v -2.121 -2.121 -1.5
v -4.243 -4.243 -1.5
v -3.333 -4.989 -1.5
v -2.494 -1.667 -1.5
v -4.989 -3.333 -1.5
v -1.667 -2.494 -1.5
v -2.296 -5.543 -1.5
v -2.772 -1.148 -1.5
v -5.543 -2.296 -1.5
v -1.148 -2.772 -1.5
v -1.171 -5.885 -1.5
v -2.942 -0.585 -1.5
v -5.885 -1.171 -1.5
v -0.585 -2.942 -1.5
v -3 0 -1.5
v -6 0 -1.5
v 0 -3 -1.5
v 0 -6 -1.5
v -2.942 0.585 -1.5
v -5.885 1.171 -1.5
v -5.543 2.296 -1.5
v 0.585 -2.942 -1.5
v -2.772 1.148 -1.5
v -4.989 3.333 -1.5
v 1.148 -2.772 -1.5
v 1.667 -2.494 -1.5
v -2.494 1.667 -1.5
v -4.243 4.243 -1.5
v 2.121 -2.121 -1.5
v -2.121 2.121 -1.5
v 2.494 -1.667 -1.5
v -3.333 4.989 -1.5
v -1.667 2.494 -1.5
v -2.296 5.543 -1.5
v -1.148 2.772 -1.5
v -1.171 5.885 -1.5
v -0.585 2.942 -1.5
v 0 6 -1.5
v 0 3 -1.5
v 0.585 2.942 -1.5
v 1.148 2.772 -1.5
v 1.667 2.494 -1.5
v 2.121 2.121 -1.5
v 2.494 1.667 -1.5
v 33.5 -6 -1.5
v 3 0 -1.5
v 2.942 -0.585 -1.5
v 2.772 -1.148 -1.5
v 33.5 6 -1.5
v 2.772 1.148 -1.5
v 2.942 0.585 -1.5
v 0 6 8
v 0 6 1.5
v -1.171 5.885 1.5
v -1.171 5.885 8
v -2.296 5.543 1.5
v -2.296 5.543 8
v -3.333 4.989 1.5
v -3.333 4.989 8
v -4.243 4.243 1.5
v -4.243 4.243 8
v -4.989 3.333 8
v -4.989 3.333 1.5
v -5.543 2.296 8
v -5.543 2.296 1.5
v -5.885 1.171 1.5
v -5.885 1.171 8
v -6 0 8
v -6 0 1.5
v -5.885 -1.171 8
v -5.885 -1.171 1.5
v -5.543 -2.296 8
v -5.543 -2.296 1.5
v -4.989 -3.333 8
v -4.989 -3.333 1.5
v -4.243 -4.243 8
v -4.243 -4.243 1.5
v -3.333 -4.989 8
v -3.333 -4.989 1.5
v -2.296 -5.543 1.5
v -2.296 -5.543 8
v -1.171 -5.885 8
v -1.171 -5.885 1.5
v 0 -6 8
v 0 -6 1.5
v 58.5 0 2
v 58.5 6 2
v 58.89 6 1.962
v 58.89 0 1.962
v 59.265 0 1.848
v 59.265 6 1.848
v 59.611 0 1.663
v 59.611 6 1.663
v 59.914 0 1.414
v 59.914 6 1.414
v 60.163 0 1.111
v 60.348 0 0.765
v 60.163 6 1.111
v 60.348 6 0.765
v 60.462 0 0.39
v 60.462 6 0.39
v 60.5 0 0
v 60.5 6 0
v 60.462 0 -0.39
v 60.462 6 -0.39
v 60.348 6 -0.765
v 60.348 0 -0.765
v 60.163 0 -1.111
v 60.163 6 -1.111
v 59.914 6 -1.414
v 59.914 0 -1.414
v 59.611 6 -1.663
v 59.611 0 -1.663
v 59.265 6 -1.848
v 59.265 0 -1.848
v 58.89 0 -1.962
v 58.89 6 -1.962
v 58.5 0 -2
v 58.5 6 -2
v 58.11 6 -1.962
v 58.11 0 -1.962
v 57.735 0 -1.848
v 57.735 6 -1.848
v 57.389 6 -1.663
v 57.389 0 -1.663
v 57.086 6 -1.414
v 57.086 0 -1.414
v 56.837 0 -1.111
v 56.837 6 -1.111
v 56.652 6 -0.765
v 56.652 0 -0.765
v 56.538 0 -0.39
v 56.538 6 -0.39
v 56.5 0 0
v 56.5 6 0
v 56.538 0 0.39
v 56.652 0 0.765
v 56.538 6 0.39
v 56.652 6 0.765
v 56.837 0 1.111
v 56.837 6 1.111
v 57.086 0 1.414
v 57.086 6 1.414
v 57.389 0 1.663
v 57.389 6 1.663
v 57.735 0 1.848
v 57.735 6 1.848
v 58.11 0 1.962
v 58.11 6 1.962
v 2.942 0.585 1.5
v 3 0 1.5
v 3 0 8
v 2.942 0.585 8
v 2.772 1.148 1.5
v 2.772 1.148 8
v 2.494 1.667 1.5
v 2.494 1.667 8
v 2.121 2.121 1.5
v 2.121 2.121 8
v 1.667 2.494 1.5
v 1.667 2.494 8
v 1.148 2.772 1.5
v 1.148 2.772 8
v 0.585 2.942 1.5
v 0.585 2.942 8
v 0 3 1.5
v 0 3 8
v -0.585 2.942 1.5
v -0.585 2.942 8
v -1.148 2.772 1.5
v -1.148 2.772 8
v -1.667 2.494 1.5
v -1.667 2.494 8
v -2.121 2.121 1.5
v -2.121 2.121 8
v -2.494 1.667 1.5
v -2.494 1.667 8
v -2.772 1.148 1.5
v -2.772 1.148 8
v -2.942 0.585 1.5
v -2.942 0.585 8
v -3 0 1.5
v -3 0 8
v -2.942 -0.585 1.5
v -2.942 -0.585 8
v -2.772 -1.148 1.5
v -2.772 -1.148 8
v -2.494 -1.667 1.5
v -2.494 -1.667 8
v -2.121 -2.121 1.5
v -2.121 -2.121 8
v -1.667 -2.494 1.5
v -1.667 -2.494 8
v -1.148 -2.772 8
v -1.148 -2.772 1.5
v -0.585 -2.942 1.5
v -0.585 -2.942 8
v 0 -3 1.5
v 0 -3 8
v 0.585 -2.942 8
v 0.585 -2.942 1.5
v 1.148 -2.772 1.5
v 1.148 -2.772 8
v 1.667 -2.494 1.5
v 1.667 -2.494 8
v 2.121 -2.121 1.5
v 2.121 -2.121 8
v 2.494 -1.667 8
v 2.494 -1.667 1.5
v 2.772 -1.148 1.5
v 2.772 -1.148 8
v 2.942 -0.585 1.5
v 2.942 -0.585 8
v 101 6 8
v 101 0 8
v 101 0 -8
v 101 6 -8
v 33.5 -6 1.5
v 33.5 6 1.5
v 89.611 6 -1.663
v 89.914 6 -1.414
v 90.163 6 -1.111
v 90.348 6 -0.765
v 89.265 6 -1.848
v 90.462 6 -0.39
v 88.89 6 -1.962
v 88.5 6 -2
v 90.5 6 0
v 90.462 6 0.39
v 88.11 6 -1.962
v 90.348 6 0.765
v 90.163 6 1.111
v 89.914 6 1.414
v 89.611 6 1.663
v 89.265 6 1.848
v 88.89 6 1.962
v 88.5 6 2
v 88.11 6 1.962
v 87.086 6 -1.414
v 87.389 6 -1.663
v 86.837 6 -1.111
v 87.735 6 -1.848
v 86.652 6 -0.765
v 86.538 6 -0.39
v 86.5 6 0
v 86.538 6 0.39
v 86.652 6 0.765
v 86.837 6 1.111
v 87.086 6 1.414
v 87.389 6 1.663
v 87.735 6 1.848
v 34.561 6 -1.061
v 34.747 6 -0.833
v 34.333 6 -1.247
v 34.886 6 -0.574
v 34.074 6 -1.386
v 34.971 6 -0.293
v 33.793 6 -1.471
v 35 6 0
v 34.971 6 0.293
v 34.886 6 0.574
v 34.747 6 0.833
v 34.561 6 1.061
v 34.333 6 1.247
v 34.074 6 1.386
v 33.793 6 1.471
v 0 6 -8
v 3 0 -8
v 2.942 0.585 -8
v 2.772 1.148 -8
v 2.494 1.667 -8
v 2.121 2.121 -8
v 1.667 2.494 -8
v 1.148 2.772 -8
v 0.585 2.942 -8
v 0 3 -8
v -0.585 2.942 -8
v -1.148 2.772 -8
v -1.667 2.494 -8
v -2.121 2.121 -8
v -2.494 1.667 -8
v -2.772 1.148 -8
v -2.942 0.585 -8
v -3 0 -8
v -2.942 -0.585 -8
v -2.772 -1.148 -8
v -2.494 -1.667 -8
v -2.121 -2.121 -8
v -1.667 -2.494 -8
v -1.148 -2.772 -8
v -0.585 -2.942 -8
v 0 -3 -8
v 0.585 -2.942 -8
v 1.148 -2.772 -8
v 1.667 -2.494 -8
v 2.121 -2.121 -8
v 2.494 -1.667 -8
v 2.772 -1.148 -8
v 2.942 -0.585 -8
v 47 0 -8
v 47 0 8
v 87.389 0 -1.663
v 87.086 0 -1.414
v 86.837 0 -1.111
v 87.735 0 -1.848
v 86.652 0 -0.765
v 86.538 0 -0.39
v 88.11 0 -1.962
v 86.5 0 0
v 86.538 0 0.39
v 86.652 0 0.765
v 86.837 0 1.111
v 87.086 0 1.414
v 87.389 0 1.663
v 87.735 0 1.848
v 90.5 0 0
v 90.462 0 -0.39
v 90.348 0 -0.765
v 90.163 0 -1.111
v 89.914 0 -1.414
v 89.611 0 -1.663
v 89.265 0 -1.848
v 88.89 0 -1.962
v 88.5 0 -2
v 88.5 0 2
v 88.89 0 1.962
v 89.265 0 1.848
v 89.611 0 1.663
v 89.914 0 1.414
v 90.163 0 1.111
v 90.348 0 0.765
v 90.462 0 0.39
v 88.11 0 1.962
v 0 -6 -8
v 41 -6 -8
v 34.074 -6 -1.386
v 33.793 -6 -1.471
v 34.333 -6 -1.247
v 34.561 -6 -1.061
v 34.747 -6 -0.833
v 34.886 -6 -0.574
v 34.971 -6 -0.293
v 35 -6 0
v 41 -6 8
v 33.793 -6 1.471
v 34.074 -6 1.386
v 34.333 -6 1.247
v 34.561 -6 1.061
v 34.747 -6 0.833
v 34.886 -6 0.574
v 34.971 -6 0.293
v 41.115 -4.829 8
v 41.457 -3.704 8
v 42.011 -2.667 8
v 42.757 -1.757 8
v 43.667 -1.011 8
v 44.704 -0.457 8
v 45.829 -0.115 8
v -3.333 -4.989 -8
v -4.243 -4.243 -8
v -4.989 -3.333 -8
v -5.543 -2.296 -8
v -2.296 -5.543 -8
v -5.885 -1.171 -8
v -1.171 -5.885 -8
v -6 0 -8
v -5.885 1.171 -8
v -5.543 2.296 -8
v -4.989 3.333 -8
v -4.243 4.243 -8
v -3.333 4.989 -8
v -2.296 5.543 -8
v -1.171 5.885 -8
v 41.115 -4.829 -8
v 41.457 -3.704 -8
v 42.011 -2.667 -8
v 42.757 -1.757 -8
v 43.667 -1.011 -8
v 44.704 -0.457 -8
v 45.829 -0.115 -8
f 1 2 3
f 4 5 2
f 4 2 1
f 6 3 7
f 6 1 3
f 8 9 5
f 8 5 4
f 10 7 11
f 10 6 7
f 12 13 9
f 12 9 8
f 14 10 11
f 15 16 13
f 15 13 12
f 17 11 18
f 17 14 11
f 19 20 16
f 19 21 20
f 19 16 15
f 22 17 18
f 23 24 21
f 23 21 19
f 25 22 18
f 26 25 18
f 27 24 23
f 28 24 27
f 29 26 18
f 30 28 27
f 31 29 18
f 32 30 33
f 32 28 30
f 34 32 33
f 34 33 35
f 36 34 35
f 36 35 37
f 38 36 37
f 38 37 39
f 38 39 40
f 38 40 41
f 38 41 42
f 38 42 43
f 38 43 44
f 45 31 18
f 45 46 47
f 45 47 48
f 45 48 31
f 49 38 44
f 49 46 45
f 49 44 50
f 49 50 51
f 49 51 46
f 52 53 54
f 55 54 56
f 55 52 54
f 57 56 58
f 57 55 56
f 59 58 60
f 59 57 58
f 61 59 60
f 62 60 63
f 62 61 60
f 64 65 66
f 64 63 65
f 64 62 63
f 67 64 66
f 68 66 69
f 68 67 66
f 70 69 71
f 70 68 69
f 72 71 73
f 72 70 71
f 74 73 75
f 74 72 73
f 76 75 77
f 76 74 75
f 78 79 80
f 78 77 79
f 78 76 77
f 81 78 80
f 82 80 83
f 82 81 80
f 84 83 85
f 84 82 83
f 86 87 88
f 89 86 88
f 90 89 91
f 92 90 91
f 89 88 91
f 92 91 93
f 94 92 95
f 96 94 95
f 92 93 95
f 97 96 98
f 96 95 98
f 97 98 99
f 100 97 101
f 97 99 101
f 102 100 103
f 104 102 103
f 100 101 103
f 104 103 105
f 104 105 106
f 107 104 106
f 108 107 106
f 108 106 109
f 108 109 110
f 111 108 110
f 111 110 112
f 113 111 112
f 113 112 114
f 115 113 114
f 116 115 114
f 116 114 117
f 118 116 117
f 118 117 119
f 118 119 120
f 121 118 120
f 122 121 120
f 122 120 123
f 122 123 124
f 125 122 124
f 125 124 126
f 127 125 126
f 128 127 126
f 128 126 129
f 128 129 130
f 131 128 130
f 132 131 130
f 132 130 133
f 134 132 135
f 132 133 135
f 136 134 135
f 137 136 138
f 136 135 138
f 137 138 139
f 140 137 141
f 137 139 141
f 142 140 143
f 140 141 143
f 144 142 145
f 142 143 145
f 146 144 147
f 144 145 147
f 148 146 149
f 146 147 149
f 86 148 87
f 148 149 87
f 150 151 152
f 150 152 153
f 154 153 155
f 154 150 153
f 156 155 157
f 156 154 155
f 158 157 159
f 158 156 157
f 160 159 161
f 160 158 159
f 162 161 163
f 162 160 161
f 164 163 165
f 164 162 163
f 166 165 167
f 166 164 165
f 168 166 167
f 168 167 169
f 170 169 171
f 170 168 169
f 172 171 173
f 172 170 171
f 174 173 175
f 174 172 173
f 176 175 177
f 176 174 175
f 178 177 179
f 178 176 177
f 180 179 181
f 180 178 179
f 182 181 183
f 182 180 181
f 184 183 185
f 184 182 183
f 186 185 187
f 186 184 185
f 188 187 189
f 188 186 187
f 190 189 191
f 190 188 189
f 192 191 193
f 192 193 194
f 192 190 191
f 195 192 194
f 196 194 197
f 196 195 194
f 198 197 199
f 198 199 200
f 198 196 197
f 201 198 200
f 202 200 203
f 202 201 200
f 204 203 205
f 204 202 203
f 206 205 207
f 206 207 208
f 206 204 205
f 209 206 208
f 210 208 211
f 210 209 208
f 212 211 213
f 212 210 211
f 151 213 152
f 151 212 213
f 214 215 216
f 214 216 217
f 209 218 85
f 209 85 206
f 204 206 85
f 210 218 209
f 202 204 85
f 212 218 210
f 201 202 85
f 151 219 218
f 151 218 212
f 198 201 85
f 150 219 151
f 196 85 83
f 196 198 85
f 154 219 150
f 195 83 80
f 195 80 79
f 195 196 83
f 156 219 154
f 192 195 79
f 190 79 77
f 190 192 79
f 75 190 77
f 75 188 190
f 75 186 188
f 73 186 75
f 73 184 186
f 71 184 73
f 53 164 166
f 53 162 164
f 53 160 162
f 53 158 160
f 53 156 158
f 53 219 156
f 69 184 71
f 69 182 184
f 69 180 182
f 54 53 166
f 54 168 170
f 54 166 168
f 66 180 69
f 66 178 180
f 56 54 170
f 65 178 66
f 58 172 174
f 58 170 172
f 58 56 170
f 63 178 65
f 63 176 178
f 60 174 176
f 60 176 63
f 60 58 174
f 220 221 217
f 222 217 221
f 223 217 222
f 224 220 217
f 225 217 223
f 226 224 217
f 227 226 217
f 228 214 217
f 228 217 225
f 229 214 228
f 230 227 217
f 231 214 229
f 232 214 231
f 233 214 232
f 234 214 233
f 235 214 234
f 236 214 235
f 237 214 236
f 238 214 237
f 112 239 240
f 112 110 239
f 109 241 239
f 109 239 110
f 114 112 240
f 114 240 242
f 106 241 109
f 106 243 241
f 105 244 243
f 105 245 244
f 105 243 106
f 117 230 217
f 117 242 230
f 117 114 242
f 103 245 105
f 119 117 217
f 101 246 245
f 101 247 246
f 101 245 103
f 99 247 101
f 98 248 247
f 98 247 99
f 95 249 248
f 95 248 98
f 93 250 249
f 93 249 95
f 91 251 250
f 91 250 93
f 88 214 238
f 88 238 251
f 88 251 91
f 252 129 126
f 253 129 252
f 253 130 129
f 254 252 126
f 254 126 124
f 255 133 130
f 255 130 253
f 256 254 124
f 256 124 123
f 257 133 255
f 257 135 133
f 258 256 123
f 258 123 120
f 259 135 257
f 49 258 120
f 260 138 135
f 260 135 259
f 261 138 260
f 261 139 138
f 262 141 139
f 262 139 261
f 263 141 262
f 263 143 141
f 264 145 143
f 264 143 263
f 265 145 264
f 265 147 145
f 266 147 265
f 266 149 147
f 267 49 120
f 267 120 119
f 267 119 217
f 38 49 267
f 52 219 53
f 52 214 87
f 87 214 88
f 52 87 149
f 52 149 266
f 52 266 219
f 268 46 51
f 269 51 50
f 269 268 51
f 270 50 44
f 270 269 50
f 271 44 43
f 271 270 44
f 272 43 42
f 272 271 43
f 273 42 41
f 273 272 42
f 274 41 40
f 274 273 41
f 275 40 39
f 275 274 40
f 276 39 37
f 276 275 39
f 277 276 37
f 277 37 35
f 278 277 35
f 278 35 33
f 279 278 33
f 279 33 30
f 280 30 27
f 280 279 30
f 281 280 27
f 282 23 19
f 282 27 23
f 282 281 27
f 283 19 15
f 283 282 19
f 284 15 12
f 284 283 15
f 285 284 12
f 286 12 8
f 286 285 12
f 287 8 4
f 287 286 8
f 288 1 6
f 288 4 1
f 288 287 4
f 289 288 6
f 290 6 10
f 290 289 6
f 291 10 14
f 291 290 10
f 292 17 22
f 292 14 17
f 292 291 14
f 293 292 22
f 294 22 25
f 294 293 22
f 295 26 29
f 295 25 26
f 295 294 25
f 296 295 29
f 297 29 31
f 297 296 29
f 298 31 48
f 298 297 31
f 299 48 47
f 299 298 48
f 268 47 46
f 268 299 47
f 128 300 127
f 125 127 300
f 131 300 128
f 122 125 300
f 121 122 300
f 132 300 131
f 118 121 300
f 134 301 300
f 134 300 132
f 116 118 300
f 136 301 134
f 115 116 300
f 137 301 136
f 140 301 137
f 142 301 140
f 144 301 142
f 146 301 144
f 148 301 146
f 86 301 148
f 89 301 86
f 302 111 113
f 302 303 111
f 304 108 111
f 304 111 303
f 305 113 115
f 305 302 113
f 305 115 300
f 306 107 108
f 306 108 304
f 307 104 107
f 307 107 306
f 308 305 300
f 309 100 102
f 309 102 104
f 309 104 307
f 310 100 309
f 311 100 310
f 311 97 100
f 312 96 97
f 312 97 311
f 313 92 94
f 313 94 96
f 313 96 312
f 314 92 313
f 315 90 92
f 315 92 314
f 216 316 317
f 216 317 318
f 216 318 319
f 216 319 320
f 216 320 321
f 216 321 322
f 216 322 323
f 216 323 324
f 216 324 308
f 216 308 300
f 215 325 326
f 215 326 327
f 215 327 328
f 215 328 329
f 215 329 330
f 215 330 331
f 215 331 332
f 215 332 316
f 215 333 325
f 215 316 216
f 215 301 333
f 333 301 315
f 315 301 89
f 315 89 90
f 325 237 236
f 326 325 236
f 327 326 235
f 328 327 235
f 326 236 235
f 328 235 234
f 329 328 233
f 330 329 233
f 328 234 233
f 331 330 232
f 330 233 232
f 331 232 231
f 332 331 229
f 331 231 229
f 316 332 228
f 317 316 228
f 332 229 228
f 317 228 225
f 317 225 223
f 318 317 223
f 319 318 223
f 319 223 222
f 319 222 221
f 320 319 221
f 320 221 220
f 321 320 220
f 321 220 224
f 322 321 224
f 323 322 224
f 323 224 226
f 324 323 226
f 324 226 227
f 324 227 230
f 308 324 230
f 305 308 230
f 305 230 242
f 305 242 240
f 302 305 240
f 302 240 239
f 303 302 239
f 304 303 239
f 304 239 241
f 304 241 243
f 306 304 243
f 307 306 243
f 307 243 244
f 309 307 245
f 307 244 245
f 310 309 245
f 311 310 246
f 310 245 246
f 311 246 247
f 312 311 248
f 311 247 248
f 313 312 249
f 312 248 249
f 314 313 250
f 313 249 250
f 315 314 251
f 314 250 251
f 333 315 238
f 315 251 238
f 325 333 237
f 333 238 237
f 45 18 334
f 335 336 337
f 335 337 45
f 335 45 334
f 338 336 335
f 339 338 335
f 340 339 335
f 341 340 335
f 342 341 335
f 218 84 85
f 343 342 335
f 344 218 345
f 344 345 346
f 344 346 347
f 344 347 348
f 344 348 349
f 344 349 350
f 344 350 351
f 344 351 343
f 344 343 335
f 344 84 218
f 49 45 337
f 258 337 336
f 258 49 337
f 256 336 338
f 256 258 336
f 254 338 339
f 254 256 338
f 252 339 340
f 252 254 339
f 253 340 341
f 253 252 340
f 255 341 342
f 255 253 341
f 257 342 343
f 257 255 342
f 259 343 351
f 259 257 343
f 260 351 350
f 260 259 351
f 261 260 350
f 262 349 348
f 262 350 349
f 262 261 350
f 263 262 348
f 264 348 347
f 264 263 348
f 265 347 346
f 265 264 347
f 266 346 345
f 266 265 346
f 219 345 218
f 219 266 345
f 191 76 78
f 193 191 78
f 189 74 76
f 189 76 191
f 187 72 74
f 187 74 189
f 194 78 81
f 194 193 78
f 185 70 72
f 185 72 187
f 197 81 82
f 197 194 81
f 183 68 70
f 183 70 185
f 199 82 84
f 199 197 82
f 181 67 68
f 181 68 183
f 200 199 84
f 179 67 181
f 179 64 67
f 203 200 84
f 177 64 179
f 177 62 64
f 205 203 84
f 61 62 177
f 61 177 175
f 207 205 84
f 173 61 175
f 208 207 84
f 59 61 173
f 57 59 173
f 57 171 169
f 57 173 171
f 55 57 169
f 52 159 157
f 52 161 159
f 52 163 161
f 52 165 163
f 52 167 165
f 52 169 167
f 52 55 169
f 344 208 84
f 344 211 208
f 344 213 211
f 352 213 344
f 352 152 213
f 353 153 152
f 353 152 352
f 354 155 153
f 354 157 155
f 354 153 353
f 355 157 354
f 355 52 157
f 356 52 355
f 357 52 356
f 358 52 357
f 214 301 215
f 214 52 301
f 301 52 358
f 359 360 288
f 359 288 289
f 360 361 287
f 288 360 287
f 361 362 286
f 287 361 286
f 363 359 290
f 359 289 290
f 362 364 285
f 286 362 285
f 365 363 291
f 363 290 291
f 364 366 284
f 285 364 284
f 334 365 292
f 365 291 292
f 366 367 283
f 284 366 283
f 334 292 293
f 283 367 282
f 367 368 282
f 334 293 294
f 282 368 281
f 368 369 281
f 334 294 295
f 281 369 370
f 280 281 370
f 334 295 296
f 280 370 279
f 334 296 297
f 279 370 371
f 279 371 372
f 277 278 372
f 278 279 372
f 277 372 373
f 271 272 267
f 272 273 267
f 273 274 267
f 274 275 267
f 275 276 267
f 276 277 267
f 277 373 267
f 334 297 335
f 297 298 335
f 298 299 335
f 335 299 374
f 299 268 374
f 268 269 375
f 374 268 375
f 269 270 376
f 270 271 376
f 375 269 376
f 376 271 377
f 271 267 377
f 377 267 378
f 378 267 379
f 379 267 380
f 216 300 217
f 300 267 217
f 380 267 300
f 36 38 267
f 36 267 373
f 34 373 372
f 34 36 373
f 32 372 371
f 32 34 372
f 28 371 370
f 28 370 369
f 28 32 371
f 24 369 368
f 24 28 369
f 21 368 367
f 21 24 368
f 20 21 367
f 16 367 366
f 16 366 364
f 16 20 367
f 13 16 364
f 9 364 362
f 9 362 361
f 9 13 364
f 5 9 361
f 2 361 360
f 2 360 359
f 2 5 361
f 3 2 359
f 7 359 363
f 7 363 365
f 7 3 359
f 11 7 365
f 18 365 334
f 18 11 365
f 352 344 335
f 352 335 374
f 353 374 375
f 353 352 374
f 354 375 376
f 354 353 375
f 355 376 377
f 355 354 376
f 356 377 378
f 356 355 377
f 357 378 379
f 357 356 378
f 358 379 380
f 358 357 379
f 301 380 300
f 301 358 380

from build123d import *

# Parameters (mm, degrees)
SKETCH2_R           = 3
BOSS_EXTRUDE1_DEPTH = 8
SKETCH3_R           = 2
CUT_EXTRUDE1_DEPTH  = 103.02450686


with BuildPart() as part:
    # Sketch2 → Boss-Extrude1 (new, symmetric)
    with BuildSketch(Plane.XY):
        with BuildLine():
            Line((0, -6), (41, -6))
            ThreePointArc((41, -6), (42.757359313, -1.757359313), (47, 0))
            Line((47, 0), (101, 0))
            Line((101, 0), (101, 6))
            Line((101, 6), (0, 6))
            ThreePointArc((0, 6), (-6, 0), (0, -6))
        make_face()
        Circle(SKETCH2_R, mode=Mode.SUBTRACT)
    extrude(amount=BOSS_EXTRUDE1_DEPTH, both=True)

    # Sketch3 → Cut-Extrude1 (cut, through all)
    with BuildSketch(Plane(origin=(0, 6, 0), x_dir=(1, 0, 0), z_dir=(0, 1, 0))):
        with Locations(Location((58.5, 0, 0), (0, 0, 270))):
            Circle(SKETCH3_R)
        with Locations(Location((88.5, 0, 0), (0, 0, 270))):
            Circle(SKETCH3_R)
        with BuildLine():
            Line((33.49999953, -1.5), (-6, -1.5))
            Line((-6, -1.5), (-6, 1.5))
            Line((-6, 1.5), (33.49999953, 1.5))
            ThreePointArc((33.49999953, 1.5), (35, 0), (33.49999953, -1.5))
        make_face()
    extrude(amount=-CUT_EXTRUDE1_DEPTH, mode=Mode.SUBTRACT)


solid = part.part
